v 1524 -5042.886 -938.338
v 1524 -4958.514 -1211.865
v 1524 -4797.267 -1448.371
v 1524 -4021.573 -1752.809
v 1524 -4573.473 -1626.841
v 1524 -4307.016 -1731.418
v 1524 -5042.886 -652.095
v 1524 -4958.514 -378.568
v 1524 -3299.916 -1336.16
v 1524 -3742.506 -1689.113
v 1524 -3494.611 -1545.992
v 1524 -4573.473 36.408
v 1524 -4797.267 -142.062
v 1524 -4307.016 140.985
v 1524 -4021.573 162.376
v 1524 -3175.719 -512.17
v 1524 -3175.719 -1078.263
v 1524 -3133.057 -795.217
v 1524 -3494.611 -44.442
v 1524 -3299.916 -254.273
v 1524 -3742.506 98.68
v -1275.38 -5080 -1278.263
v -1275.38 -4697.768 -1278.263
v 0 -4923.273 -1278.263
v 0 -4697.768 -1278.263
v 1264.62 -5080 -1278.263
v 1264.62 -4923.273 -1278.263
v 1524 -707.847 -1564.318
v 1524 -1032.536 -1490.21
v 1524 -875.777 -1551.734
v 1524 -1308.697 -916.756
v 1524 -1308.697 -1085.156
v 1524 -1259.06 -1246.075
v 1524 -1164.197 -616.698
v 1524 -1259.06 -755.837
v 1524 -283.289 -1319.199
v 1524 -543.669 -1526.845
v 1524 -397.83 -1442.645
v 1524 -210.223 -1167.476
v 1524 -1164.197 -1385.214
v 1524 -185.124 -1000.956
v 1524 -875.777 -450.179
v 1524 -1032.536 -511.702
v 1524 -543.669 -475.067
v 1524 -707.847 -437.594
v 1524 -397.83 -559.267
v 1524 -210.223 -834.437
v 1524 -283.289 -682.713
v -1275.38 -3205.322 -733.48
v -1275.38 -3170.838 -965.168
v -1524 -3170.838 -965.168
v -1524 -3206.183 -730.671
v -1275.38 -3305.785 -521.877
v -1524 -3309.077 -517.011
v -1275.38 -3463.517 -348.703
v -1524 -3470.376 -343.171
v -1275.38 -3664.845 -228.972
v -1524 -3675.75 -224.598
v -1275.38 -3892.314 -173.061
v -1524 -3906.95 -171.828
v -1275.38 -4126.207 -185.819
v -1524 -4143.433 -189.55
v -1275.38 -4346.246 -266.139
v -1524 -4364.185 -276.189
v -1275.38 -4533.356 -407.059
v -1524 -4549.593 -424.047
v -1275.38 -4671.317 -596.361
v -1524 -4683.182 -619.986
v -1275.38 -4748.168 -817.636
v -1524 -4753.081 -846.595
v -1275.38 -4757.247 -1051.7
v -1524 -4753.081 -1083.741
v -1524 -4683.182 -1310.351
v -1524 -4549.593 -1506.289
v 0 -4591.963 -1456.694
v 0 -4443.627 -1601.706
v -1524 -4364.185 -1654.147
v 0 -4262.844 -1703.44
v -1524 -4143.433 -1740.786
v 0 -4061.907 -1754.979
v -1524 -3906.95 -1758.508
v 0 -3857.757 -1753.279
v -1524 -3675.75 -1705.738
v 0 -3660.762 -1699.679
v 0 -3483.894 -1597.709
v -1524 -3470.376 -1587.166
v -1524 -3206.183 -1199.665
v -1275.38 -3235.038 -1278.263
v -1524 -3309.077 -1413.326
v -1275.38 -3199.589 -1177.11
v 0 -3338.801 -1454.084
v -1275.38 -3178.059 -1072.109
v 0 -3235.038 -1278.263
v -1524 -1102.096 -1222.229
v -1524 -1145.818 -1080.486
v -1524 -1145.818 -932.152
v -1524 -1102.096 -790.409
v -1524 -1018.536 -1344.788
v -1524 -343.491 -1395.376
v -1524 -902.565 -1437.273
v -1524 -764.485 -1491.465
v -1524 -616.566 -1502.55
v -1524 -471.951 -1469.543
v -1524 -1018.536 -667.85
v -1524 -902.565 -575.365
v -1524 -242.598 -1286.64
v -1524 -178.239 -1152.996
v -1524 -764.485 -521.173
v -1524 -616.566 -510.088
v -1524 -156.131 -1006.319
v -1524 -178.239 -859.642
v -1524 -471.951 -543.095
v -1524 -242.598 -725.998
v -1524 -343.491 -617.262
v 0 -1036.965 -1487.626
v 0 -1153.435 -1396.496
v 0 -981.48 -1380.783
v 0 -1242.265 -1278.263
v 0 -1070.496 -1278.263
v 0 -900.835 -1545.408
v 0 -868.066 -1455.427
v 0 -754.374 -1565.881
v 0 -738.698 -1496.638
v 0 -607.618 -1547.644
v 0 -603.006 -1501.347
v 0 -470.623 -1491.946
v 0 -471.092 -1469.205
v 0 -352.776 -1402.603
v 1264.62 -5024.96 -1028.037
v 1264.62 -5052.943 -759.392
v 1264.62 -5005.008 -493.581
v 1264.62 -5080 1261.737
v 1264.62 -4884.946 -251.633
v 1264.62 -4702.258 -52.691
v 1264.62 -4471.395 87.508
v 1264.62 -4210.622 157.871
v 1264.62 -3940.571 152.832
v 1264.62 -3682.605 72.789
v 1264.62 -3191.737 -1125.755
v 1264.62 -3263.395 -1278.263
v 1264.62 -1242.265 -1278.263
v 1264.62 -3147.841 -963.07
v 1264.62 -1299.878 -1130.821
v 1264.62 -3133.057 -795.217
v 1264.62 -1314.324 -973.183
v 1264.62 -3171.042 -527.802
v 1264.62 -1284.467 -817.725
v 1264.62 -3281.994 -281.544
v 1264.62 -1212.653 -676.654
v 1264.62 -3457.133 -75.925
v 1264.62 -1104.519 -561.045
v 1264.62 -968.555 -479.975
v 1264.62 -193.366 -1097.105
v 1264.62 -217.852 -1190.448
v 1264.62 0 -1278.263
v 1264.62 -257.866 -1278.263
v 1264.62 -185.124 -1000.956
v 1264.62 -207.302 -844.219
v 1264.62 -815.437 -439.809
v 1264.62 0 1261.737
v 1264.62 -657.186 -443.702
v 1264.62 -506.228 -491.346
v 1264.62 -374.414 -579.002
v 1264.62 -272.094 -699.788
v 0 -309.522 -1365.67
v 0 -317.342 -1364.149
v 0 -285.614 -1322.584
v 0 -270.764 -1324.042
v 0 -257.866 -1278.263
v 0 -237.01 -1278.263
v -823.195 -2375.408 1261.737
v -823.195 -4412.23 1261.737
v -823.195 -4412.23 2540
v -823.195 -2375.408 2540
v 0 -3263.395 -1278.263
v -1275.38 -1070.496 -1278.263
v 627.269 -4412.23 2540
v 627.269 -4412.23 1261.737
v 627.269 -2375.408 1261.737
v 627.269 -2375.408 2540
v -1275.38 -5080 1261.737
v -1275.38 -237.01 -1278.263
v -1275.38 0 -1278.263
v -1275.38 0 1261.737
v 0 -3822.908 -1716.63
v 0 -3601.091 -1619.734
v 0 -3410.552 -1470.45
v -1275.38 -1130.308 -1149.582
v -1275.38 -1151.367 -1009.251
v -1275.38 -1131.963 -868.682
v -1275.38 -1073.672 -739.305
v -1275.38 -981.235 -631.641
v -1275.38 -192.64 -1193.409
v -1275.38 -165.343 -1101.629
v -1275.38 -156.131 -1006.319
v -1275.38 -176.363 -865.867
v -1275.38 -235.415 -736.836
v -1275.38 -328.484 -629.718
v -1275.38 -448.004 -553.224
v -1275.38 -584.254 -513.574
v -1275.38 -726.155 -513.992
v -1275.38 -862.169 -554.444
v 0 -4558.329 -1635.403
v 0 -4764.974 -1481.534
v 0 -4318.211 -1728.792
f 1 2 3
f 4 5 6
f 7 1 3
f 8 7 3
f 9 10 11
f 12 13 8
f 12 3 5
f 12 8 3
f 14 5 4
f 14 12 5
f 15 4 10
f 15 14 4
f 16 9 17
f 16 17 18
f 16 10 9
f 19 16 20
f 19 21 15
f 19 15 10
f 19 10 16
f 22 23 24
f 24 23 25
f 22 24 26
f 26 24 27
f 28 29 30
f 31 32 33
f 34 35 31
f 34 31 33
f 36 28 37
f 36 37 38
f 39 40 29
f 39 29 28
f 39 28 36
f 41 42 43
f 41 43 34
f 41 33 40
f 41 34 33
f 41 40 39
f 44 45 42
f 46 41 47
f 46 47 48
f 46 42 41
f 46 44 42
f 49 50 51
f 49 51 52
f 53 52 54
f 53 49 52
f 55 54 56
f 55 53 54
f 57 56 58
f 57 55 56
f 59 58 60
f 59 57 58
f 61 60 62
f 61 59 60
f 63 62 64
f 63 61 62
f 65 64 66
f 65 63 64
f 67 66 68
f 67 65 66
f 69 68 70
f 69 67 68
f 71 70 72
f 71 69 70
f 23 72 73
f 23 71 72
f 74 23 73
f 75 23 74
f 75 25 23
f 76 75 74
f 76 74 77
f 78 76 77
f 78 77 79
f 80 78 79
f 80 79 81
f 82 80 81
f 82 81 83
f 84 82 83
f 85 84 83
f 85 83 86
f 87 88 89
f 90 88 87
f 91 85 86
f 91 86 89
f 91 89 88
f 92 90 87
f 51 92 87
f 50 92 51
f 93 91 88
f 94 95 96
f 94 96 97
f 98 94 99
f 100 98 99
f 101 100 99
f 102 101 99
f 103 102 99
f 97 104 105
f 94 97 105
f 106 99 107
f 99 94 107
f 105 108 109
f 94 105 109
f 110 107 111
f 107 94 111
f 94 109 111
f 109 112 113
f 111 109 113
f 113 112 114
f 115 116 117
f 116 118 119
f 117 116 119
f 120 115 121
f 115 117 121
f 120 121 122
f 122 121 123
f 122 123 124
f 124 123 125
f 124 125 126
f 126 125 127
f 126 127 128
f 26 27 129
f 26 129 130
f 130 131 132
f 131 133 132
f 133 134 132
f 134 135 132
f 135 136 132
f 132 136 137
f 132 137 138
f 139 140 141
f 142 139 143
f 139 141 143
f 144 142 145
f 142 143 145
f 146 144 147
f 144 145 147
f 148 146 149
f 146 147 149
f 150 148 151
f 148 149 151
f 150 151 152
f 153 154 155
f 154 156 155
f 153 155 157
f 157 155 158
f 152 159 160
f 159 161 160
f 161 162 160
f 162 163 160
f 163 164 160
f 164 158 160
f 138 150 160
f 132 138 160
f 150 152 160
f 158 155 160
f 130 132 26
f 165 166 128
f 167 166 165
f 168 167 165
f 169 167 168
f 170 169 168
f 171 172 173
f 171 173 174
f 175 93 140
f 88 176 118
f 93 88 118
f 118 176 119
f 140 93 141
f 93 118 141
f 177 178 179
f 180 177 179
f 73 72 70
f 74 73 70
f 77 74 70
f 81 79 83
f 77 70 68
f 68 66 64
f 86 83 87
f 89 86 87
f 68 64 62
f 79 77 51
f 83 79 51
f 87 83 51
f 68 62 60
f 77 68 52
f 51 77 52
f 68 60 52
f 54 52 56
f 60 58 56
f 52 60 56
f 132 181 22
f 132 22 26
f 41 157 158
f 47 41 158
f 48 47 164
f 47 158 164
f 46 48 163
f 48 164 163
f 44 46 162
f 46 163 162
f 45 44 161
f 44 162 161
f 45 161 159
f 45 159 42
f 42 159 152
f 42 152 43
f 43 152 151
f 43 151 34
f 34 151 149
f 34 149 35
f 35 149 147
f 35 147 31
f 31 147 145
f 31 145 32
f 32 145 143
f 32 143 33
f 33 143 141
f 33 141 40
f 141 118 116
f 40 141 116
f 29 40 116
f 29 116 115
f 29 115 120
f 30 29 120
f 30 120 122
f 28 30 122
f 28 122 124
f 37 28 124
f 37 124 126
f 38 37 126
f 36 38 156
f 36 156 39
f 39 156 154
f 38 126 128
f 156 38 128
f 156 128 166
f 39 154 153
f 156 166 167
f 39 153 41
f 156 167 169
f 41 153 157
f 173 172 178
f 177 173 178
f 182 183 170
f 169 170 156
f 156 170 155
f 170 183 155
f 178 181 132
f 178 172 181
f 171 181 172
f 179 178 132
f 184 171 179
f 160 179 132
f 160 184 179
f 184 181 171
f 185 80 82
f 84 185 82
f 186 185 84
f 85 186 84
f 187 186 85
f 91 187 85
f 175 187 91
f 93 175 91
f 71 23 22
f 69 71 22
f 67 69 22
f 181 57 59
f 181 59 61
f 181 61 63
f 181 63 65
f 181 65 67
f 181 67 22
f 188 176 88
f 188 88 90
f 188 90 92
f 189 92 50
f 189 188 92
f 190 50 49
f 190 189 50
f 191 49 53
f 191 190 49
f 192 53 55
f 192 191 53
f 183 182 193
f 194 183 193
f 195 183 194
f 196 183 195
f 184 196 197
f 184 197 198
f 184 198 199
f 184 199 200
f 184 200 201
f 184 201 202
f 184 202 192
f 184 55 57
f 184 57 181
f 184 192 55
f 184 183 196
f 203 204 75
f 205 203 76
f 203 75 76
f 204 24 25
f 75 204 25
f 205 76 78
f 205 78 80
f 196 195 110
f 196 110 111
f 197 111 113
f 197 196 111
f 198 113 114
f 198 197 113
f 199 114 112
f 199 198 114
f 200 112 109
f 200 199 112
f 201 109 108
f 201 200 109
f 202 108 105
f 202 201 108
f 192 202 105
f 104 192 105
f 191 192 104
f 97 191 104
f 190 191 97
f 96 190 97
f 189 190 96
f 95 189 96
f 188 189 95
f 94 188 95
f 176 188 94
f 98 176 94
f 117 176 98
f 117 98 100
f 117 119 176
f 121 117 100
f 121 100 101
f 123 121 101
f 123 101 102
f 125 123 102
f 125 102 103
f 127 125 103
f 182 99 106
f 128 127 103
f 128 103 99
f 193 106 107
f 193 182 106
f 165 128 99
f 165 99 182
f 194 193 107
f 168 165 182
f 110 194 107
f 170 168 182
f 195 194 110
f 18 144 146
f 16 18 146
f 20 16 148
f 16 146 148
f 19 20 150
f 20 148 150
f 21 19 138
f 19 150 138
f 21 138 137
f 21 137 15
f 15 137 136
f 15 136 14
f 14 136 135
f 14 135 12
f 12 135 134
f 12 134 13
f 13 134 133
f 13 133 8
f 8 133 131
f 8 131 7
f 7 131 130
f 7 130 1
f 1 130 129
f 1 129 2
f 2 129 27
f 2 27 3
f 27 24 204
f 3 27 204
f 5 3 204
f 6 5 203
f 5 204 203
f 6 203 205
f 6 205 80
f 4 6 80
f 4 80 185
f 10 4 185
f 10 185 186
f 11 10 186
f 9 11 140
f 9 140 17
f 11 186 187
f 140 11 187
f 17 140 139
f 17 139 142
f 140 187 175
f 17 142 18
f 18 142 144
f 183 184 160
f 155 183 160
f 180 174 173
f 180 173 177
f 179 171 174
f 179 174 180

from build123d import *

# Parameters (mm, degrees)
F0_W     = 2540
F0_H     = 2540.000068
F1_DEPTH = 5080
F2_W     = 1450.464129
F2_H     = 2036.821842
F3_DEPTH = 2540
F4_R     = 564.941606
F4_R_2   = 960.277285
F5_DEPTH = 1524
F6_R     = 497.622563
F6_R_2   = 795.564444
F7_DEPTH = 1524


with BuildPart() as f1:
    # F0 (on Front) → F1 (new body)
    with BuildSketch(Plane.XZ):
        with Locations((-5.380282, -8.262568)):
            Rectangle(F0_W, F0_H)
    extrude(amount=F1_DEPTH)

    # F2 (on Top) → F3 (join)
    with BuildSketch(Plane.XY):
        with Locations((-97.963095, -3393.819094)):
            Rectangle(F2_W, F2_H)
    extrude(amount=F3_DEPTH)

    # F4 (on Right) → F5 (join)
    with BuildSketch(Plane.YZ):
        with Locations((-750.065506, -1000.956178)):
            Circle(F4_R)
        with Locations((-4093.334198, -795.21656)):
            Circle(F4_R_2)
    extrude(amount=F5_DEPTH)

    # F6 (on Right) → F7 (join)
    with BuildSketch(Plane.YZ):
        with Locations((-653.753221, -1006.319046)):
            Circle(F6_R)
        with Locations((-3966.402769, -965.168178)):
            Circle(F6_R_2)
    extrude(amount=-F7_DEPTH)


solid = f1.part
